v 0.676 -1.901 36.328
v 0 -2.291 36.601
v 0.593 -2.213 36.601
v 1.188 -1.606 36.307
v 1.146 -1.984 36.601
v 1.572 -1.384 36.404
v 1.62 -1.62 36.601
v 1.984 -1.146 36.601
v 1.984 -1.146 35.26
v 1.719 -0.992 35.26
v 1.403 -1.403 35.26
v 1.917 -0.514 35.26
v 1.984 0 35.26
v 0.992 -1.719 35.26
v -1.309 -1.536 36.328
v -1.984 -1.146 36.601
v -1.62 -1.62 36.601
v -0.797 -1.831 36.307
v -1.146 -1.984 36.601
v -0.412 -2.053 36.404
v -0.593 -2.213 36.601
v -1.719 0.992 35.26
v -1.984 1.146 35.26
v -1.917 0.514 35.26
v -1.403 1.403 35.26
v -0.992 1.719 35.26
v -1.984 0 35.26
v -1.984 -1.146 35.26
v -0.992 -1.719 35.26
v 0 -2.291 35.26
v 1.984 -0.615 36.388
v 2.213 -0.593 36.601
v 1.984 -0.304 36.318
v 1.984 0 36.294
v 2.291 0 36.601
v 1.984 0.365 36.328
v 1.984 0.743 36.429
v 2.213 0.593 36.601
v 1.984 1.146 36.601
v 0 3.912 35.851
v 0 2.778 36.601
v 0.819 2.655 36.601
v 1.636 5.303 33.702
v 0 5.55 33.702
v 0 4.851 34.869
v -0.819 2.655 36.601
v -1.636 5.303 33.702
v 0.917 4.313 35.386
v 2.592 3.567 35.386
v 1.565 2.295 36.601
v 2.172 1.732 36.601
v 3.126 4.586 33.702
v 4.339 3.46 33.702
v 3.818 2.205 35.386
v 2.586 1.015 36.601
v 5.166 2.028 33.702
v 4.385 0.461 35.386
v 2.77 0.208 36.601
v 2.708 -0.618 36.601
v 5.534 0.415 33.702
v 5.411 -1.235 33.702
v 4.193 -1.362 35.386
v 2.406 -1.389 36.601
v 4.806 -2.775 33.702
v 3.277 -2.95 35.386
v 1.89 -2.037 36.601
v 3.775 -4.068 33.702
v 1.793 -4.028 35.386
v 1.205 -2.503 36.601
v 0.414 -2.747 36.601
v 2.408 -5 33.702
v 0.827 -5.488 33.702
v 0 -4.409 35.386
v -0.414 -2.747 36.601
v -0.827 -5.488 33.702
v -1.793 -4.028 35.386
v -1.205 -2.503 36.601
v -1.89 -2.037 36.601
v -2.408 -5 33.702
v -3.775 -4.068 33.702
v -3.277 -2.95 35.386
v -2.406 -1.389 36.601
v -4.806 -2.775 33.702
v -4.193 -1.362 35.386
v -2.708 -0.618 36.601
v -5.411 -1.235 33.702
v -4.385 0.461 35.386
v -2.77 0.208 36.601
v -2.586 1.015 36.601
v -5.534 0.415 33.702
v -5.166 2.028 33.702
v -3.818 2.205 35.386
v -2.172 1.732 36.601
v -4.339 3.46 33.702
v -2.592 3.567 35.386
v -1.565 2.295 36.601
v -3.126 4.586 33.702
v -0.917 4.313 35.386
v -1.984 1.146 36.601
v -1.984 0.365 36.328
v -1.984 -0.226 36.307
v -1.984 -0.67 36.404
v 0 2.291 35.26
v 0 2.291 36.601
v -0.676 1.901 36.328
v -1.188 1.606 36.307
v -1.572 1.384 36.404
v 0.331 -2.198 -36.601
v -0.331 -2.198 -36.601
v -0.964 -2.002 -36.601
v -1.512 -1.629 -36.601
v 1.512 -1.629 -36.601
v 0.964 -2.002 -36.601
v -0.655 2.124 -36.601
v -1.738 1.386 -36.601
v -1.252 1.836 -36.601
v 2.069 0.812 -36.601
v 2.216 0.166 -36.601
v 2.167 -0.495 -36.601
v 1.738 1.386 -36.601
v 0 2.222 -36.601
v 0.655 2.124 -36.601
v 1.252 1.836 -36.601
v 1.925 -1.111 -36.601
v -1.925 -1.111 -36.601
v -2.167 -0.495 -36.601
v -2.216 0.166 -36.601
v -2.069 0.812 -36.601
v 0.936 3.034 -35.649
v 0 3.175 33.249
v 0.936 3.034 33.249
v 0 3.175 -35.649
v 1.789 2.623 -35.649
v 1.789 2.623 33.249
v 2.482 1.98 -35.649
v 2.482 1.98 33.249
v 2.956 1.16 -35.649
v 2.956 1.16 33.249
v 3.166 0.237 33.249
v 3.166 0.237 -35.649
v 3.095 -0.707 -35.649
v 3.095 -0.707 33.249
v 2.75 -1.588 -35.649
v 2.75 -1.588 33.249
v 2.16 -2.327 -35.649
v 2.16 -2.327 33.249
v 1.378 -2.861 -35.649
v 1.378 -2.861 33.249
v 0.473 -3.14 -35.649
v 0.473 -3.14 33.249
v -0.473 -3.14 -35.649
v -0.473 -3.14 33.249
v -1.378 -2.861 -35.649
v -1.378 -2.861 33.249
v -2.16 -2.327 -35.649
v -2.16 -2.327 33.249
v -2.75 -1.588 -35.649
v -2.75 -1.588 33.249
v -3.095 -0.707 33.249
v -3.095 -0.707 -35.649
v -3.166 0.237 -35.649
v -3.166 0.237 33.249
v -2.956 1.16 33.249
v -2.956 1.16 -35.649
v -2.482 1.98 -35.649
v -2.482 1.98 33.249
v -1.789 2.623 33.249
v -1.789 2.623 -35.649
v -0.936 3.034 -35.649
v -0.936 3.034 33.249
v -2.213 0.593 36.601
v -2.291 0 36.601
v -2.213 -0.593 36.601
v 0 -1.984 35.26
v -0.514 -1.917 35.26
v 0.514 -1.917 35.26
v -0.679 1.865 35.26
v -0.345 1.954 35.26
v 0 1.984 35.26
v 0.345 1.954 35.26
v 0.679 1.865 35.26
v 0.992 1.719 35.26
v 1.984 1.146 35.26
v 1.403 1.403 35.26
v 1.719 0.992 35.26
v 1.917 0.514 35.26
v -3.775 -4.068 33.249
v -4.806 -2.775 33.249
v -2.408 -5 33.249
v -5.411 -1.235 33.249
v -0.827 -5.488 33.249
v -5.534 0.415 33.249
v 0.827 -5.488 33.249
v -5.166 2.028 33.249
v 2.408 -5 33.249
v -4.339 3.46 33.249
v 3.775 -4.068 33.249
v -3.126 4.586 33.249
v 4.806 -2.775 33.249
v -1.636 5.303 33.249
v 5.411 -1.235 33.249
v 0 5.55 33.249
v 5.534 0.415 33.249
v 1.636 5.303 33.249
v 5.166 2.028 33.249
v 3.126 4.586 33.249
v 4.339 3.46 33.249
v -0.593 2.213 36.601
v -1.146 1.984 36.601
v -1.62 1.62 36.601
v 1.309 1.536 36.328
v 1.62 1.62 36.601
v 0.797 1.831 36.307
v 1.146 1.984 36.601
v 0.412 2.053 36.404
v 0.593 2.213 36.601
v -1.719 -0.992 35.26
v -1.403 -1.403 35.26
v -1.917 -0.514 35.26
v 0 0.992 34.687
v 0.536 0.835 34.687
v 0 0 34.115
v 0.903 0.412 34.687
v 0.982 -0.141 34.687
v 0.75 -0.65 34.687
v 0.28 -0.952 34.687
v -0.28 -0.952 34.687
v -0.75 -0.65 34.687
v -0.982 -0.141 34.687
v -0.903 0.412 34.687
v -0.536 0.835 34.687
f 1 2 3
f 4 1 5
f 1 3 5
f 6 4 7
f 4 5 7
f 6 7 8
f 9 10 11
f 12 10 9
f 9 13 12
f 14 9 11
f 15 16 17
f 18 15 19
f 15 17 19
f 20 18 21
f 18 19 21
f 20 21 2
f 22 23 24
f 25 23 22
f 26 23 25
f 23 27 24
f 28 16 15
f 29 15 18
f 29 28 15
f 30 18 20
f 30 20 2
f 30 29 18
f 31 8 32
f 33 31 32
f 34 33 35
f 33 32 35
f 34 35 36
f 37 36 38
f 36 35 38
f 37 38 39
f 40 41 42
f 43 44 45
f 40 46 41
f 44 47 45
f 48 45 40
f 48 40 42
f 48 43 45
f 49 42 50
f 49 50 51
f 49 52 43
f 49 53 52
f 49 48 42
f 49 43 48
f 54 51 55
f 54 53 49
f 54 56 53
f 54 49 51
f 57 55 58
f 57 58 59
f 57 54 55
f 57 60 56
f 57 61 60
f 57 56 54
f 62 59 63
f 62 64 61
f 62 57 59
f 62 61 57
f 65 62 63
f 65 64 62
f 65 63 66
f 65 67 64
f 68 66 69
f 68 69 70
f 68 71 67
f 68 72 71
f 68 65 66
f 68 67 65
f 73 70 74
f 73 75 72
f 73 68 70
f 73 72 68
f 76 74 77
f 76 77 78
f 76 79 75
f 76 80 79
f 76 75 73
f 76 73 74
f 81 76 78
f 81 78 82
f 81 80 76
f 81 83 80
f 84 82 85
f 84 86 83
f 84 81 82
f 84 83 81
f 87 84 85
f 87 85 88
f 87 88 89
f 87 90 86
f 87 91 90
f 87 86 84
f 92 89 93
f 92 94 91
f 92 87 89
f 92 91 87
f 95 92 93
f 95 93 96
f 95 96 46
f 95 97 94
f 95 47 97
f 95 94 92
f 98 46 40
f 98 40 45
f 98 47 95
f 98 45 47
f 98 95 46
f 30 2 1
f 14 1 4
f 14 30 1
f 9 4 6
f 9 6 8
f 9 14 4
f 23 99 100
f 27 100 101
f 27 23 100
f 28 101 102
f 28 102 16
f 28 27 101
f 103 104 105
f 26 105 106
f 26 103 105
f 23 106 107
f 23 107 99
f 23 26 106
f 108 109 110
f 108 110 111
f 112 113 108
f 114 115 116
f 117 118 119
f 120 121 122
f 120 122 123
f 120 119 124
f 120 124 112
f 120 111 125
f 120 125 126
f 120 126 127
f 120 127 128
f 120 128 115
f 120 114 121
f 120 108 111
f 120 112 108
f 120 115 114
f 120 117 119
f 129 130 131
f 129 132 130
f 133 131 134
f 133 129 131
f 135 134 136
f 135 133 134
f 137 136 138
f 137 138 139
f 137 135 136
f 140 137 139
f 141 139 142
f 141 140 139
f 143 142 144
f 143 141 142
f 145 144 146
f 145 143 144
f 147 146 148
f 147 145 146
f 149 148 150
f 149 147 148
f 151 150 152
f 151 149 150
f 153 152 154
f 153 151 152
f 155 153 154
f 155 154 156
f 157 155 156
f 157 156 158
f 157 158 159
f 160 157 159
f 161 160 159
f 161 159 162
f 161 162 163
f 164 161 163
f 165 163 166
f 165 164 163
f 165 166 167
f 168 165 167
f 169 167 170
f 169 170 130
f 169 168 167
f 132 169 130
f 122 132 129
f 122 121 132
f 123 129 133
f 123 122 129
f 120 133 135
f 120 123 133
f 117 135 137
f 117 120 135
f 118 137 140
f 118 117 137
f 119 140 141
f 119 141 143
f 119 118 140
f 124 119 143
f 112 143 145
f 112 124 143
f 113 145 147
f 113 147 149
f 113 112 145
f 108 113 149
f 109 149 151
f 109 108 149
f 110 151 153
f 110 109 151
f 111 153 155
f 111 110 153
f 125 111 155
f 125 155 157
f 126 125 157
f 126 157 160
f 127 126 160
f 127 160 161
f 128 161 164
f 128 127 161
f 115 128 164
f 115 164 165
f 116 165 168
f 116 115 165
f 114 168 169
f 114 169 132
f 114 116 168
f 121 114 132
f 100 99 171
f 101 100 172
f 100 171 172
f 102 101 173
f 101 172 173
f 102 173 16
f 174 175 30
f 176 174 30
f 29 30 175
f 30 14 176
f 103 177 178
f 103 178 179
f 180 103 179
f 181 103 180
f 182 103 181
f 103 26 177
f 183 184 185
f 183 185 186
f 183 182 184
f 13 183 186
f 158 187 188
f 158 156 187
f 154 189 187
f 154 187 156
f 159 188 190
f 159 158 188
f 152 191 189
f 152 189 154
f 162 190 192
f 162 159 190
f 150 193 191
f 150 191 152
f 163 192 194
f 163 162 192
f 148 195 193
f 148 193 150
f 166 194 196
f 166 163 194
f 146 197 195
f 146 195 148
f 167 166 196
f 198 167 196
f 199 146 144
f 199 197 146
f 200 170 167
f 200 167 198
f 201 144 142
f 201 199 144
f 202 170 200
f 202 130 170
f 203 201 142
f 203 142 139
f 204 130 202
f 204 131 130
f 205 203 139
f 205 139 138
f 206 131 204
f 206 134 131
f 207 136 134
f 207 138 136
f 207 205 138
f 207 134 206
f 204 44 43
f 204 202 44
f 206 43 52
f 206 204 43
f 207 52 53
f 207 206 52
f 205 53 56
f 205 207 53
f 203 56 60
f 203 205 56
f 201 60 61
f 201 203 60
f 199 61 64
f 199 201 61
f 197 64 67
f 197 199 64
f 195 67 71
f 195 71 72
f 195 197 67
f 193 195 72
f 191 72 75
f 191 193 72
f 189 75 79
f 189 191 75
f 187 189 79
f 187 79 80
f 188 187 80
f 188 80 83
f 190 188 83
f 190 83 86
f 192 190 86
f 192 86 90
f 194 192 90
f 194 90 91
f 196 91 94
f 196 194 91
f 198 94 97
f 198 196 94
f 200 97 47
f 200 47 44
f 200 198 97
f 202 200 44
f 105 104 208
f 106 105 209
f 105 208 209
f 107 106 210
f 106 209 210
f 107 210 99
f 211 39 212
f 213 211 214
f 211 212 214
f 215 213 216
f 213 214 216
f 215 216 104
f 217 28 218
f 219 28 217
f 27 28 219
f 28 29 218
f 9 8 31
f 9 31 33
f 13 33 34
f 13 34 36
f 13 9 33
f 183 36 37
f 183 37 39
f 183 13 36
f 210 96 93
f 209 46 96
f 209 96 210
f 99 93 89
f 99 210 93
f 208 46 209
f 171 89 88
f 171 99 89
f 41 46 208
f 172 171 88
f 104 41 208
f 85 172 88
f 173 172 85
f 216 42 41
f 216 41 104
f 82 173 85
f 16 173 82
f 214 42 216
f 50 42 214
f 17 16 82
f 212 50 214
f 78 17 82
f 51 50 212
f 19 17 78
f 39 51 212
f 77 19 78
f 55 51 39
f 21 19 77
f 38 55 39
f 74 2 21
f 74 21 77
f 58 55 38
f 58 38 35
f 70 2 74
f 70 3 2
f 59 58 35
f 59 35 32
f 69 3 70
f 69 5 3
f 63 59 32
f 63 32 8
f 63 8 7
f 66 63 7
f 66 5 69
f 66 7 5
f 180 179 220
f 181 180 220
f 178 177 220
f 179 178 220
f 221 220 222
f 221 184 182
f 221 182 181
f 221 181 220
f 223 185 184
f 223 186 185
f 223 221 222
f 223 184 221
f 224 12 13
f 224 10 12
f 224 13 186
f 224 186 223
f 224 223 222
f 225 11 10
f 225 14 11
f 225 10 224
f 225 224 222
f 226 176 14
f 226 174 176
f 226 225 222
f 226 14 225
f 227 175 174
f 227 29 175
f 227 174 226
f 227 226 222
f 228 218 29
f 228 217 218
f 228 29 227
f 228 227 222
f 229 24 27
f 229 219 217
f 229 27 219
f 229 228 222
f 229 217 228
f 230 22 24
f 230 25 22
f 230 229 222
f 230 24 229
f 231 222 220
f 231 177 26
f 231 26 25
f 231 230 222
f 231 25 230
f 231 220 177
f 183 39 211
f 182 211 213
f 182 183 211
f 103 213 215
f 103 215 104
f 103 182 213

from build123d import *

# Parameters (mm, degrees)
CUT_EXTRUDE1_START = 35.26028
CUT_EXTRUDE1_DEPTH = 2.34112
SKETCH4_R          = 2.291358881
CUT_EXTRUDE2_DEPTH = 1.34112
CUT_EXTRUDE2_DRAFT = -45


with BuildPart() as part:
    # Sketch2 → Revolve1 (revolve)
    with BuildSketch(Plane(origin=(0, 0, 0), x_dir=(0, 0, -1), z_dir=(1, 0, 0))):
        with BuildLine():
            Line((-36.6014, 1.984375), (-36.6014, 2.778125))
            ThreePointArc((-36.6014, 2.778125), (-35.386122602, 4.40912482), (-33.702171429, 5.5499))
            Line((-33.702171429, 5.5499), (-33.2486, 5.5499))
            Line((-33.2486, 5.5499), (-33.2486, 3.175))
            Line((-33.2486, 3.175), (35.6489, 3.175))
            Line((35.6489, 3.175), (36.6014, 2.2225))
            Line((36.6014, 2.2225), (36.6014, 0))
            Line((36.6014, 0), (-34.11460056, 0))
            Line((-34.11460056, 0), (-35.26028, 1.984375))
            Line((-35.26028, 1.984375), (-36.6014, 1.984375))
        make_face()
    revolve(axis=Axis((0, 0, 36.6014), (0, 0, -1)))

    # Sketch3 → Cut-Extrude1 (cut, through all)
    with BuildSketch(Plane.XY.offset(CUT_EXTRUDE1_START)):
        Polygon((0, 2.291358881), (-1.984375, 1.14567944), (-1.984375, -1.14567944), (0, -2.291358881), (1.984375, -1.14567944), (1.984375, 1.14567944), align=None)
    extrude(amount=CUT_EXTRUDE1_DEPTH, mode=Mode.SUBTRACT)


with BuildPart() as cut_extrude2_tool:
    # Sketch4 → Cut-Extrude2 (with draft: the straight prism first)
    with BuildSketch(Plane.XY.offset(36.6014)):
        Circle(SKETCH4_R)
    extrude(amount=-CUT_EXTRUDE2_DEPTH)
    # Cut-Extrude2: the draft: its side faces are tilted about the plane it starts from
    cut_extrude2_sides = [cut_extrude2_tool.faces().sort_by_distance(p)[0] for p in [
        (-2.291358881, 0, 35.93084),
    ]]
    draft(cut_extrude2_sides, Plane.XY.offset(36.6014), CUT_EXTRUDE2_DRAFT)


with BuildPart() as part_1:
    add(part.part)

    # Cut-Extrude2: cut by cut_extrude2_tool
    add(cut_extrude2_tool.part, mode=Mode.SUBTRACT)


solid = part_1.part
